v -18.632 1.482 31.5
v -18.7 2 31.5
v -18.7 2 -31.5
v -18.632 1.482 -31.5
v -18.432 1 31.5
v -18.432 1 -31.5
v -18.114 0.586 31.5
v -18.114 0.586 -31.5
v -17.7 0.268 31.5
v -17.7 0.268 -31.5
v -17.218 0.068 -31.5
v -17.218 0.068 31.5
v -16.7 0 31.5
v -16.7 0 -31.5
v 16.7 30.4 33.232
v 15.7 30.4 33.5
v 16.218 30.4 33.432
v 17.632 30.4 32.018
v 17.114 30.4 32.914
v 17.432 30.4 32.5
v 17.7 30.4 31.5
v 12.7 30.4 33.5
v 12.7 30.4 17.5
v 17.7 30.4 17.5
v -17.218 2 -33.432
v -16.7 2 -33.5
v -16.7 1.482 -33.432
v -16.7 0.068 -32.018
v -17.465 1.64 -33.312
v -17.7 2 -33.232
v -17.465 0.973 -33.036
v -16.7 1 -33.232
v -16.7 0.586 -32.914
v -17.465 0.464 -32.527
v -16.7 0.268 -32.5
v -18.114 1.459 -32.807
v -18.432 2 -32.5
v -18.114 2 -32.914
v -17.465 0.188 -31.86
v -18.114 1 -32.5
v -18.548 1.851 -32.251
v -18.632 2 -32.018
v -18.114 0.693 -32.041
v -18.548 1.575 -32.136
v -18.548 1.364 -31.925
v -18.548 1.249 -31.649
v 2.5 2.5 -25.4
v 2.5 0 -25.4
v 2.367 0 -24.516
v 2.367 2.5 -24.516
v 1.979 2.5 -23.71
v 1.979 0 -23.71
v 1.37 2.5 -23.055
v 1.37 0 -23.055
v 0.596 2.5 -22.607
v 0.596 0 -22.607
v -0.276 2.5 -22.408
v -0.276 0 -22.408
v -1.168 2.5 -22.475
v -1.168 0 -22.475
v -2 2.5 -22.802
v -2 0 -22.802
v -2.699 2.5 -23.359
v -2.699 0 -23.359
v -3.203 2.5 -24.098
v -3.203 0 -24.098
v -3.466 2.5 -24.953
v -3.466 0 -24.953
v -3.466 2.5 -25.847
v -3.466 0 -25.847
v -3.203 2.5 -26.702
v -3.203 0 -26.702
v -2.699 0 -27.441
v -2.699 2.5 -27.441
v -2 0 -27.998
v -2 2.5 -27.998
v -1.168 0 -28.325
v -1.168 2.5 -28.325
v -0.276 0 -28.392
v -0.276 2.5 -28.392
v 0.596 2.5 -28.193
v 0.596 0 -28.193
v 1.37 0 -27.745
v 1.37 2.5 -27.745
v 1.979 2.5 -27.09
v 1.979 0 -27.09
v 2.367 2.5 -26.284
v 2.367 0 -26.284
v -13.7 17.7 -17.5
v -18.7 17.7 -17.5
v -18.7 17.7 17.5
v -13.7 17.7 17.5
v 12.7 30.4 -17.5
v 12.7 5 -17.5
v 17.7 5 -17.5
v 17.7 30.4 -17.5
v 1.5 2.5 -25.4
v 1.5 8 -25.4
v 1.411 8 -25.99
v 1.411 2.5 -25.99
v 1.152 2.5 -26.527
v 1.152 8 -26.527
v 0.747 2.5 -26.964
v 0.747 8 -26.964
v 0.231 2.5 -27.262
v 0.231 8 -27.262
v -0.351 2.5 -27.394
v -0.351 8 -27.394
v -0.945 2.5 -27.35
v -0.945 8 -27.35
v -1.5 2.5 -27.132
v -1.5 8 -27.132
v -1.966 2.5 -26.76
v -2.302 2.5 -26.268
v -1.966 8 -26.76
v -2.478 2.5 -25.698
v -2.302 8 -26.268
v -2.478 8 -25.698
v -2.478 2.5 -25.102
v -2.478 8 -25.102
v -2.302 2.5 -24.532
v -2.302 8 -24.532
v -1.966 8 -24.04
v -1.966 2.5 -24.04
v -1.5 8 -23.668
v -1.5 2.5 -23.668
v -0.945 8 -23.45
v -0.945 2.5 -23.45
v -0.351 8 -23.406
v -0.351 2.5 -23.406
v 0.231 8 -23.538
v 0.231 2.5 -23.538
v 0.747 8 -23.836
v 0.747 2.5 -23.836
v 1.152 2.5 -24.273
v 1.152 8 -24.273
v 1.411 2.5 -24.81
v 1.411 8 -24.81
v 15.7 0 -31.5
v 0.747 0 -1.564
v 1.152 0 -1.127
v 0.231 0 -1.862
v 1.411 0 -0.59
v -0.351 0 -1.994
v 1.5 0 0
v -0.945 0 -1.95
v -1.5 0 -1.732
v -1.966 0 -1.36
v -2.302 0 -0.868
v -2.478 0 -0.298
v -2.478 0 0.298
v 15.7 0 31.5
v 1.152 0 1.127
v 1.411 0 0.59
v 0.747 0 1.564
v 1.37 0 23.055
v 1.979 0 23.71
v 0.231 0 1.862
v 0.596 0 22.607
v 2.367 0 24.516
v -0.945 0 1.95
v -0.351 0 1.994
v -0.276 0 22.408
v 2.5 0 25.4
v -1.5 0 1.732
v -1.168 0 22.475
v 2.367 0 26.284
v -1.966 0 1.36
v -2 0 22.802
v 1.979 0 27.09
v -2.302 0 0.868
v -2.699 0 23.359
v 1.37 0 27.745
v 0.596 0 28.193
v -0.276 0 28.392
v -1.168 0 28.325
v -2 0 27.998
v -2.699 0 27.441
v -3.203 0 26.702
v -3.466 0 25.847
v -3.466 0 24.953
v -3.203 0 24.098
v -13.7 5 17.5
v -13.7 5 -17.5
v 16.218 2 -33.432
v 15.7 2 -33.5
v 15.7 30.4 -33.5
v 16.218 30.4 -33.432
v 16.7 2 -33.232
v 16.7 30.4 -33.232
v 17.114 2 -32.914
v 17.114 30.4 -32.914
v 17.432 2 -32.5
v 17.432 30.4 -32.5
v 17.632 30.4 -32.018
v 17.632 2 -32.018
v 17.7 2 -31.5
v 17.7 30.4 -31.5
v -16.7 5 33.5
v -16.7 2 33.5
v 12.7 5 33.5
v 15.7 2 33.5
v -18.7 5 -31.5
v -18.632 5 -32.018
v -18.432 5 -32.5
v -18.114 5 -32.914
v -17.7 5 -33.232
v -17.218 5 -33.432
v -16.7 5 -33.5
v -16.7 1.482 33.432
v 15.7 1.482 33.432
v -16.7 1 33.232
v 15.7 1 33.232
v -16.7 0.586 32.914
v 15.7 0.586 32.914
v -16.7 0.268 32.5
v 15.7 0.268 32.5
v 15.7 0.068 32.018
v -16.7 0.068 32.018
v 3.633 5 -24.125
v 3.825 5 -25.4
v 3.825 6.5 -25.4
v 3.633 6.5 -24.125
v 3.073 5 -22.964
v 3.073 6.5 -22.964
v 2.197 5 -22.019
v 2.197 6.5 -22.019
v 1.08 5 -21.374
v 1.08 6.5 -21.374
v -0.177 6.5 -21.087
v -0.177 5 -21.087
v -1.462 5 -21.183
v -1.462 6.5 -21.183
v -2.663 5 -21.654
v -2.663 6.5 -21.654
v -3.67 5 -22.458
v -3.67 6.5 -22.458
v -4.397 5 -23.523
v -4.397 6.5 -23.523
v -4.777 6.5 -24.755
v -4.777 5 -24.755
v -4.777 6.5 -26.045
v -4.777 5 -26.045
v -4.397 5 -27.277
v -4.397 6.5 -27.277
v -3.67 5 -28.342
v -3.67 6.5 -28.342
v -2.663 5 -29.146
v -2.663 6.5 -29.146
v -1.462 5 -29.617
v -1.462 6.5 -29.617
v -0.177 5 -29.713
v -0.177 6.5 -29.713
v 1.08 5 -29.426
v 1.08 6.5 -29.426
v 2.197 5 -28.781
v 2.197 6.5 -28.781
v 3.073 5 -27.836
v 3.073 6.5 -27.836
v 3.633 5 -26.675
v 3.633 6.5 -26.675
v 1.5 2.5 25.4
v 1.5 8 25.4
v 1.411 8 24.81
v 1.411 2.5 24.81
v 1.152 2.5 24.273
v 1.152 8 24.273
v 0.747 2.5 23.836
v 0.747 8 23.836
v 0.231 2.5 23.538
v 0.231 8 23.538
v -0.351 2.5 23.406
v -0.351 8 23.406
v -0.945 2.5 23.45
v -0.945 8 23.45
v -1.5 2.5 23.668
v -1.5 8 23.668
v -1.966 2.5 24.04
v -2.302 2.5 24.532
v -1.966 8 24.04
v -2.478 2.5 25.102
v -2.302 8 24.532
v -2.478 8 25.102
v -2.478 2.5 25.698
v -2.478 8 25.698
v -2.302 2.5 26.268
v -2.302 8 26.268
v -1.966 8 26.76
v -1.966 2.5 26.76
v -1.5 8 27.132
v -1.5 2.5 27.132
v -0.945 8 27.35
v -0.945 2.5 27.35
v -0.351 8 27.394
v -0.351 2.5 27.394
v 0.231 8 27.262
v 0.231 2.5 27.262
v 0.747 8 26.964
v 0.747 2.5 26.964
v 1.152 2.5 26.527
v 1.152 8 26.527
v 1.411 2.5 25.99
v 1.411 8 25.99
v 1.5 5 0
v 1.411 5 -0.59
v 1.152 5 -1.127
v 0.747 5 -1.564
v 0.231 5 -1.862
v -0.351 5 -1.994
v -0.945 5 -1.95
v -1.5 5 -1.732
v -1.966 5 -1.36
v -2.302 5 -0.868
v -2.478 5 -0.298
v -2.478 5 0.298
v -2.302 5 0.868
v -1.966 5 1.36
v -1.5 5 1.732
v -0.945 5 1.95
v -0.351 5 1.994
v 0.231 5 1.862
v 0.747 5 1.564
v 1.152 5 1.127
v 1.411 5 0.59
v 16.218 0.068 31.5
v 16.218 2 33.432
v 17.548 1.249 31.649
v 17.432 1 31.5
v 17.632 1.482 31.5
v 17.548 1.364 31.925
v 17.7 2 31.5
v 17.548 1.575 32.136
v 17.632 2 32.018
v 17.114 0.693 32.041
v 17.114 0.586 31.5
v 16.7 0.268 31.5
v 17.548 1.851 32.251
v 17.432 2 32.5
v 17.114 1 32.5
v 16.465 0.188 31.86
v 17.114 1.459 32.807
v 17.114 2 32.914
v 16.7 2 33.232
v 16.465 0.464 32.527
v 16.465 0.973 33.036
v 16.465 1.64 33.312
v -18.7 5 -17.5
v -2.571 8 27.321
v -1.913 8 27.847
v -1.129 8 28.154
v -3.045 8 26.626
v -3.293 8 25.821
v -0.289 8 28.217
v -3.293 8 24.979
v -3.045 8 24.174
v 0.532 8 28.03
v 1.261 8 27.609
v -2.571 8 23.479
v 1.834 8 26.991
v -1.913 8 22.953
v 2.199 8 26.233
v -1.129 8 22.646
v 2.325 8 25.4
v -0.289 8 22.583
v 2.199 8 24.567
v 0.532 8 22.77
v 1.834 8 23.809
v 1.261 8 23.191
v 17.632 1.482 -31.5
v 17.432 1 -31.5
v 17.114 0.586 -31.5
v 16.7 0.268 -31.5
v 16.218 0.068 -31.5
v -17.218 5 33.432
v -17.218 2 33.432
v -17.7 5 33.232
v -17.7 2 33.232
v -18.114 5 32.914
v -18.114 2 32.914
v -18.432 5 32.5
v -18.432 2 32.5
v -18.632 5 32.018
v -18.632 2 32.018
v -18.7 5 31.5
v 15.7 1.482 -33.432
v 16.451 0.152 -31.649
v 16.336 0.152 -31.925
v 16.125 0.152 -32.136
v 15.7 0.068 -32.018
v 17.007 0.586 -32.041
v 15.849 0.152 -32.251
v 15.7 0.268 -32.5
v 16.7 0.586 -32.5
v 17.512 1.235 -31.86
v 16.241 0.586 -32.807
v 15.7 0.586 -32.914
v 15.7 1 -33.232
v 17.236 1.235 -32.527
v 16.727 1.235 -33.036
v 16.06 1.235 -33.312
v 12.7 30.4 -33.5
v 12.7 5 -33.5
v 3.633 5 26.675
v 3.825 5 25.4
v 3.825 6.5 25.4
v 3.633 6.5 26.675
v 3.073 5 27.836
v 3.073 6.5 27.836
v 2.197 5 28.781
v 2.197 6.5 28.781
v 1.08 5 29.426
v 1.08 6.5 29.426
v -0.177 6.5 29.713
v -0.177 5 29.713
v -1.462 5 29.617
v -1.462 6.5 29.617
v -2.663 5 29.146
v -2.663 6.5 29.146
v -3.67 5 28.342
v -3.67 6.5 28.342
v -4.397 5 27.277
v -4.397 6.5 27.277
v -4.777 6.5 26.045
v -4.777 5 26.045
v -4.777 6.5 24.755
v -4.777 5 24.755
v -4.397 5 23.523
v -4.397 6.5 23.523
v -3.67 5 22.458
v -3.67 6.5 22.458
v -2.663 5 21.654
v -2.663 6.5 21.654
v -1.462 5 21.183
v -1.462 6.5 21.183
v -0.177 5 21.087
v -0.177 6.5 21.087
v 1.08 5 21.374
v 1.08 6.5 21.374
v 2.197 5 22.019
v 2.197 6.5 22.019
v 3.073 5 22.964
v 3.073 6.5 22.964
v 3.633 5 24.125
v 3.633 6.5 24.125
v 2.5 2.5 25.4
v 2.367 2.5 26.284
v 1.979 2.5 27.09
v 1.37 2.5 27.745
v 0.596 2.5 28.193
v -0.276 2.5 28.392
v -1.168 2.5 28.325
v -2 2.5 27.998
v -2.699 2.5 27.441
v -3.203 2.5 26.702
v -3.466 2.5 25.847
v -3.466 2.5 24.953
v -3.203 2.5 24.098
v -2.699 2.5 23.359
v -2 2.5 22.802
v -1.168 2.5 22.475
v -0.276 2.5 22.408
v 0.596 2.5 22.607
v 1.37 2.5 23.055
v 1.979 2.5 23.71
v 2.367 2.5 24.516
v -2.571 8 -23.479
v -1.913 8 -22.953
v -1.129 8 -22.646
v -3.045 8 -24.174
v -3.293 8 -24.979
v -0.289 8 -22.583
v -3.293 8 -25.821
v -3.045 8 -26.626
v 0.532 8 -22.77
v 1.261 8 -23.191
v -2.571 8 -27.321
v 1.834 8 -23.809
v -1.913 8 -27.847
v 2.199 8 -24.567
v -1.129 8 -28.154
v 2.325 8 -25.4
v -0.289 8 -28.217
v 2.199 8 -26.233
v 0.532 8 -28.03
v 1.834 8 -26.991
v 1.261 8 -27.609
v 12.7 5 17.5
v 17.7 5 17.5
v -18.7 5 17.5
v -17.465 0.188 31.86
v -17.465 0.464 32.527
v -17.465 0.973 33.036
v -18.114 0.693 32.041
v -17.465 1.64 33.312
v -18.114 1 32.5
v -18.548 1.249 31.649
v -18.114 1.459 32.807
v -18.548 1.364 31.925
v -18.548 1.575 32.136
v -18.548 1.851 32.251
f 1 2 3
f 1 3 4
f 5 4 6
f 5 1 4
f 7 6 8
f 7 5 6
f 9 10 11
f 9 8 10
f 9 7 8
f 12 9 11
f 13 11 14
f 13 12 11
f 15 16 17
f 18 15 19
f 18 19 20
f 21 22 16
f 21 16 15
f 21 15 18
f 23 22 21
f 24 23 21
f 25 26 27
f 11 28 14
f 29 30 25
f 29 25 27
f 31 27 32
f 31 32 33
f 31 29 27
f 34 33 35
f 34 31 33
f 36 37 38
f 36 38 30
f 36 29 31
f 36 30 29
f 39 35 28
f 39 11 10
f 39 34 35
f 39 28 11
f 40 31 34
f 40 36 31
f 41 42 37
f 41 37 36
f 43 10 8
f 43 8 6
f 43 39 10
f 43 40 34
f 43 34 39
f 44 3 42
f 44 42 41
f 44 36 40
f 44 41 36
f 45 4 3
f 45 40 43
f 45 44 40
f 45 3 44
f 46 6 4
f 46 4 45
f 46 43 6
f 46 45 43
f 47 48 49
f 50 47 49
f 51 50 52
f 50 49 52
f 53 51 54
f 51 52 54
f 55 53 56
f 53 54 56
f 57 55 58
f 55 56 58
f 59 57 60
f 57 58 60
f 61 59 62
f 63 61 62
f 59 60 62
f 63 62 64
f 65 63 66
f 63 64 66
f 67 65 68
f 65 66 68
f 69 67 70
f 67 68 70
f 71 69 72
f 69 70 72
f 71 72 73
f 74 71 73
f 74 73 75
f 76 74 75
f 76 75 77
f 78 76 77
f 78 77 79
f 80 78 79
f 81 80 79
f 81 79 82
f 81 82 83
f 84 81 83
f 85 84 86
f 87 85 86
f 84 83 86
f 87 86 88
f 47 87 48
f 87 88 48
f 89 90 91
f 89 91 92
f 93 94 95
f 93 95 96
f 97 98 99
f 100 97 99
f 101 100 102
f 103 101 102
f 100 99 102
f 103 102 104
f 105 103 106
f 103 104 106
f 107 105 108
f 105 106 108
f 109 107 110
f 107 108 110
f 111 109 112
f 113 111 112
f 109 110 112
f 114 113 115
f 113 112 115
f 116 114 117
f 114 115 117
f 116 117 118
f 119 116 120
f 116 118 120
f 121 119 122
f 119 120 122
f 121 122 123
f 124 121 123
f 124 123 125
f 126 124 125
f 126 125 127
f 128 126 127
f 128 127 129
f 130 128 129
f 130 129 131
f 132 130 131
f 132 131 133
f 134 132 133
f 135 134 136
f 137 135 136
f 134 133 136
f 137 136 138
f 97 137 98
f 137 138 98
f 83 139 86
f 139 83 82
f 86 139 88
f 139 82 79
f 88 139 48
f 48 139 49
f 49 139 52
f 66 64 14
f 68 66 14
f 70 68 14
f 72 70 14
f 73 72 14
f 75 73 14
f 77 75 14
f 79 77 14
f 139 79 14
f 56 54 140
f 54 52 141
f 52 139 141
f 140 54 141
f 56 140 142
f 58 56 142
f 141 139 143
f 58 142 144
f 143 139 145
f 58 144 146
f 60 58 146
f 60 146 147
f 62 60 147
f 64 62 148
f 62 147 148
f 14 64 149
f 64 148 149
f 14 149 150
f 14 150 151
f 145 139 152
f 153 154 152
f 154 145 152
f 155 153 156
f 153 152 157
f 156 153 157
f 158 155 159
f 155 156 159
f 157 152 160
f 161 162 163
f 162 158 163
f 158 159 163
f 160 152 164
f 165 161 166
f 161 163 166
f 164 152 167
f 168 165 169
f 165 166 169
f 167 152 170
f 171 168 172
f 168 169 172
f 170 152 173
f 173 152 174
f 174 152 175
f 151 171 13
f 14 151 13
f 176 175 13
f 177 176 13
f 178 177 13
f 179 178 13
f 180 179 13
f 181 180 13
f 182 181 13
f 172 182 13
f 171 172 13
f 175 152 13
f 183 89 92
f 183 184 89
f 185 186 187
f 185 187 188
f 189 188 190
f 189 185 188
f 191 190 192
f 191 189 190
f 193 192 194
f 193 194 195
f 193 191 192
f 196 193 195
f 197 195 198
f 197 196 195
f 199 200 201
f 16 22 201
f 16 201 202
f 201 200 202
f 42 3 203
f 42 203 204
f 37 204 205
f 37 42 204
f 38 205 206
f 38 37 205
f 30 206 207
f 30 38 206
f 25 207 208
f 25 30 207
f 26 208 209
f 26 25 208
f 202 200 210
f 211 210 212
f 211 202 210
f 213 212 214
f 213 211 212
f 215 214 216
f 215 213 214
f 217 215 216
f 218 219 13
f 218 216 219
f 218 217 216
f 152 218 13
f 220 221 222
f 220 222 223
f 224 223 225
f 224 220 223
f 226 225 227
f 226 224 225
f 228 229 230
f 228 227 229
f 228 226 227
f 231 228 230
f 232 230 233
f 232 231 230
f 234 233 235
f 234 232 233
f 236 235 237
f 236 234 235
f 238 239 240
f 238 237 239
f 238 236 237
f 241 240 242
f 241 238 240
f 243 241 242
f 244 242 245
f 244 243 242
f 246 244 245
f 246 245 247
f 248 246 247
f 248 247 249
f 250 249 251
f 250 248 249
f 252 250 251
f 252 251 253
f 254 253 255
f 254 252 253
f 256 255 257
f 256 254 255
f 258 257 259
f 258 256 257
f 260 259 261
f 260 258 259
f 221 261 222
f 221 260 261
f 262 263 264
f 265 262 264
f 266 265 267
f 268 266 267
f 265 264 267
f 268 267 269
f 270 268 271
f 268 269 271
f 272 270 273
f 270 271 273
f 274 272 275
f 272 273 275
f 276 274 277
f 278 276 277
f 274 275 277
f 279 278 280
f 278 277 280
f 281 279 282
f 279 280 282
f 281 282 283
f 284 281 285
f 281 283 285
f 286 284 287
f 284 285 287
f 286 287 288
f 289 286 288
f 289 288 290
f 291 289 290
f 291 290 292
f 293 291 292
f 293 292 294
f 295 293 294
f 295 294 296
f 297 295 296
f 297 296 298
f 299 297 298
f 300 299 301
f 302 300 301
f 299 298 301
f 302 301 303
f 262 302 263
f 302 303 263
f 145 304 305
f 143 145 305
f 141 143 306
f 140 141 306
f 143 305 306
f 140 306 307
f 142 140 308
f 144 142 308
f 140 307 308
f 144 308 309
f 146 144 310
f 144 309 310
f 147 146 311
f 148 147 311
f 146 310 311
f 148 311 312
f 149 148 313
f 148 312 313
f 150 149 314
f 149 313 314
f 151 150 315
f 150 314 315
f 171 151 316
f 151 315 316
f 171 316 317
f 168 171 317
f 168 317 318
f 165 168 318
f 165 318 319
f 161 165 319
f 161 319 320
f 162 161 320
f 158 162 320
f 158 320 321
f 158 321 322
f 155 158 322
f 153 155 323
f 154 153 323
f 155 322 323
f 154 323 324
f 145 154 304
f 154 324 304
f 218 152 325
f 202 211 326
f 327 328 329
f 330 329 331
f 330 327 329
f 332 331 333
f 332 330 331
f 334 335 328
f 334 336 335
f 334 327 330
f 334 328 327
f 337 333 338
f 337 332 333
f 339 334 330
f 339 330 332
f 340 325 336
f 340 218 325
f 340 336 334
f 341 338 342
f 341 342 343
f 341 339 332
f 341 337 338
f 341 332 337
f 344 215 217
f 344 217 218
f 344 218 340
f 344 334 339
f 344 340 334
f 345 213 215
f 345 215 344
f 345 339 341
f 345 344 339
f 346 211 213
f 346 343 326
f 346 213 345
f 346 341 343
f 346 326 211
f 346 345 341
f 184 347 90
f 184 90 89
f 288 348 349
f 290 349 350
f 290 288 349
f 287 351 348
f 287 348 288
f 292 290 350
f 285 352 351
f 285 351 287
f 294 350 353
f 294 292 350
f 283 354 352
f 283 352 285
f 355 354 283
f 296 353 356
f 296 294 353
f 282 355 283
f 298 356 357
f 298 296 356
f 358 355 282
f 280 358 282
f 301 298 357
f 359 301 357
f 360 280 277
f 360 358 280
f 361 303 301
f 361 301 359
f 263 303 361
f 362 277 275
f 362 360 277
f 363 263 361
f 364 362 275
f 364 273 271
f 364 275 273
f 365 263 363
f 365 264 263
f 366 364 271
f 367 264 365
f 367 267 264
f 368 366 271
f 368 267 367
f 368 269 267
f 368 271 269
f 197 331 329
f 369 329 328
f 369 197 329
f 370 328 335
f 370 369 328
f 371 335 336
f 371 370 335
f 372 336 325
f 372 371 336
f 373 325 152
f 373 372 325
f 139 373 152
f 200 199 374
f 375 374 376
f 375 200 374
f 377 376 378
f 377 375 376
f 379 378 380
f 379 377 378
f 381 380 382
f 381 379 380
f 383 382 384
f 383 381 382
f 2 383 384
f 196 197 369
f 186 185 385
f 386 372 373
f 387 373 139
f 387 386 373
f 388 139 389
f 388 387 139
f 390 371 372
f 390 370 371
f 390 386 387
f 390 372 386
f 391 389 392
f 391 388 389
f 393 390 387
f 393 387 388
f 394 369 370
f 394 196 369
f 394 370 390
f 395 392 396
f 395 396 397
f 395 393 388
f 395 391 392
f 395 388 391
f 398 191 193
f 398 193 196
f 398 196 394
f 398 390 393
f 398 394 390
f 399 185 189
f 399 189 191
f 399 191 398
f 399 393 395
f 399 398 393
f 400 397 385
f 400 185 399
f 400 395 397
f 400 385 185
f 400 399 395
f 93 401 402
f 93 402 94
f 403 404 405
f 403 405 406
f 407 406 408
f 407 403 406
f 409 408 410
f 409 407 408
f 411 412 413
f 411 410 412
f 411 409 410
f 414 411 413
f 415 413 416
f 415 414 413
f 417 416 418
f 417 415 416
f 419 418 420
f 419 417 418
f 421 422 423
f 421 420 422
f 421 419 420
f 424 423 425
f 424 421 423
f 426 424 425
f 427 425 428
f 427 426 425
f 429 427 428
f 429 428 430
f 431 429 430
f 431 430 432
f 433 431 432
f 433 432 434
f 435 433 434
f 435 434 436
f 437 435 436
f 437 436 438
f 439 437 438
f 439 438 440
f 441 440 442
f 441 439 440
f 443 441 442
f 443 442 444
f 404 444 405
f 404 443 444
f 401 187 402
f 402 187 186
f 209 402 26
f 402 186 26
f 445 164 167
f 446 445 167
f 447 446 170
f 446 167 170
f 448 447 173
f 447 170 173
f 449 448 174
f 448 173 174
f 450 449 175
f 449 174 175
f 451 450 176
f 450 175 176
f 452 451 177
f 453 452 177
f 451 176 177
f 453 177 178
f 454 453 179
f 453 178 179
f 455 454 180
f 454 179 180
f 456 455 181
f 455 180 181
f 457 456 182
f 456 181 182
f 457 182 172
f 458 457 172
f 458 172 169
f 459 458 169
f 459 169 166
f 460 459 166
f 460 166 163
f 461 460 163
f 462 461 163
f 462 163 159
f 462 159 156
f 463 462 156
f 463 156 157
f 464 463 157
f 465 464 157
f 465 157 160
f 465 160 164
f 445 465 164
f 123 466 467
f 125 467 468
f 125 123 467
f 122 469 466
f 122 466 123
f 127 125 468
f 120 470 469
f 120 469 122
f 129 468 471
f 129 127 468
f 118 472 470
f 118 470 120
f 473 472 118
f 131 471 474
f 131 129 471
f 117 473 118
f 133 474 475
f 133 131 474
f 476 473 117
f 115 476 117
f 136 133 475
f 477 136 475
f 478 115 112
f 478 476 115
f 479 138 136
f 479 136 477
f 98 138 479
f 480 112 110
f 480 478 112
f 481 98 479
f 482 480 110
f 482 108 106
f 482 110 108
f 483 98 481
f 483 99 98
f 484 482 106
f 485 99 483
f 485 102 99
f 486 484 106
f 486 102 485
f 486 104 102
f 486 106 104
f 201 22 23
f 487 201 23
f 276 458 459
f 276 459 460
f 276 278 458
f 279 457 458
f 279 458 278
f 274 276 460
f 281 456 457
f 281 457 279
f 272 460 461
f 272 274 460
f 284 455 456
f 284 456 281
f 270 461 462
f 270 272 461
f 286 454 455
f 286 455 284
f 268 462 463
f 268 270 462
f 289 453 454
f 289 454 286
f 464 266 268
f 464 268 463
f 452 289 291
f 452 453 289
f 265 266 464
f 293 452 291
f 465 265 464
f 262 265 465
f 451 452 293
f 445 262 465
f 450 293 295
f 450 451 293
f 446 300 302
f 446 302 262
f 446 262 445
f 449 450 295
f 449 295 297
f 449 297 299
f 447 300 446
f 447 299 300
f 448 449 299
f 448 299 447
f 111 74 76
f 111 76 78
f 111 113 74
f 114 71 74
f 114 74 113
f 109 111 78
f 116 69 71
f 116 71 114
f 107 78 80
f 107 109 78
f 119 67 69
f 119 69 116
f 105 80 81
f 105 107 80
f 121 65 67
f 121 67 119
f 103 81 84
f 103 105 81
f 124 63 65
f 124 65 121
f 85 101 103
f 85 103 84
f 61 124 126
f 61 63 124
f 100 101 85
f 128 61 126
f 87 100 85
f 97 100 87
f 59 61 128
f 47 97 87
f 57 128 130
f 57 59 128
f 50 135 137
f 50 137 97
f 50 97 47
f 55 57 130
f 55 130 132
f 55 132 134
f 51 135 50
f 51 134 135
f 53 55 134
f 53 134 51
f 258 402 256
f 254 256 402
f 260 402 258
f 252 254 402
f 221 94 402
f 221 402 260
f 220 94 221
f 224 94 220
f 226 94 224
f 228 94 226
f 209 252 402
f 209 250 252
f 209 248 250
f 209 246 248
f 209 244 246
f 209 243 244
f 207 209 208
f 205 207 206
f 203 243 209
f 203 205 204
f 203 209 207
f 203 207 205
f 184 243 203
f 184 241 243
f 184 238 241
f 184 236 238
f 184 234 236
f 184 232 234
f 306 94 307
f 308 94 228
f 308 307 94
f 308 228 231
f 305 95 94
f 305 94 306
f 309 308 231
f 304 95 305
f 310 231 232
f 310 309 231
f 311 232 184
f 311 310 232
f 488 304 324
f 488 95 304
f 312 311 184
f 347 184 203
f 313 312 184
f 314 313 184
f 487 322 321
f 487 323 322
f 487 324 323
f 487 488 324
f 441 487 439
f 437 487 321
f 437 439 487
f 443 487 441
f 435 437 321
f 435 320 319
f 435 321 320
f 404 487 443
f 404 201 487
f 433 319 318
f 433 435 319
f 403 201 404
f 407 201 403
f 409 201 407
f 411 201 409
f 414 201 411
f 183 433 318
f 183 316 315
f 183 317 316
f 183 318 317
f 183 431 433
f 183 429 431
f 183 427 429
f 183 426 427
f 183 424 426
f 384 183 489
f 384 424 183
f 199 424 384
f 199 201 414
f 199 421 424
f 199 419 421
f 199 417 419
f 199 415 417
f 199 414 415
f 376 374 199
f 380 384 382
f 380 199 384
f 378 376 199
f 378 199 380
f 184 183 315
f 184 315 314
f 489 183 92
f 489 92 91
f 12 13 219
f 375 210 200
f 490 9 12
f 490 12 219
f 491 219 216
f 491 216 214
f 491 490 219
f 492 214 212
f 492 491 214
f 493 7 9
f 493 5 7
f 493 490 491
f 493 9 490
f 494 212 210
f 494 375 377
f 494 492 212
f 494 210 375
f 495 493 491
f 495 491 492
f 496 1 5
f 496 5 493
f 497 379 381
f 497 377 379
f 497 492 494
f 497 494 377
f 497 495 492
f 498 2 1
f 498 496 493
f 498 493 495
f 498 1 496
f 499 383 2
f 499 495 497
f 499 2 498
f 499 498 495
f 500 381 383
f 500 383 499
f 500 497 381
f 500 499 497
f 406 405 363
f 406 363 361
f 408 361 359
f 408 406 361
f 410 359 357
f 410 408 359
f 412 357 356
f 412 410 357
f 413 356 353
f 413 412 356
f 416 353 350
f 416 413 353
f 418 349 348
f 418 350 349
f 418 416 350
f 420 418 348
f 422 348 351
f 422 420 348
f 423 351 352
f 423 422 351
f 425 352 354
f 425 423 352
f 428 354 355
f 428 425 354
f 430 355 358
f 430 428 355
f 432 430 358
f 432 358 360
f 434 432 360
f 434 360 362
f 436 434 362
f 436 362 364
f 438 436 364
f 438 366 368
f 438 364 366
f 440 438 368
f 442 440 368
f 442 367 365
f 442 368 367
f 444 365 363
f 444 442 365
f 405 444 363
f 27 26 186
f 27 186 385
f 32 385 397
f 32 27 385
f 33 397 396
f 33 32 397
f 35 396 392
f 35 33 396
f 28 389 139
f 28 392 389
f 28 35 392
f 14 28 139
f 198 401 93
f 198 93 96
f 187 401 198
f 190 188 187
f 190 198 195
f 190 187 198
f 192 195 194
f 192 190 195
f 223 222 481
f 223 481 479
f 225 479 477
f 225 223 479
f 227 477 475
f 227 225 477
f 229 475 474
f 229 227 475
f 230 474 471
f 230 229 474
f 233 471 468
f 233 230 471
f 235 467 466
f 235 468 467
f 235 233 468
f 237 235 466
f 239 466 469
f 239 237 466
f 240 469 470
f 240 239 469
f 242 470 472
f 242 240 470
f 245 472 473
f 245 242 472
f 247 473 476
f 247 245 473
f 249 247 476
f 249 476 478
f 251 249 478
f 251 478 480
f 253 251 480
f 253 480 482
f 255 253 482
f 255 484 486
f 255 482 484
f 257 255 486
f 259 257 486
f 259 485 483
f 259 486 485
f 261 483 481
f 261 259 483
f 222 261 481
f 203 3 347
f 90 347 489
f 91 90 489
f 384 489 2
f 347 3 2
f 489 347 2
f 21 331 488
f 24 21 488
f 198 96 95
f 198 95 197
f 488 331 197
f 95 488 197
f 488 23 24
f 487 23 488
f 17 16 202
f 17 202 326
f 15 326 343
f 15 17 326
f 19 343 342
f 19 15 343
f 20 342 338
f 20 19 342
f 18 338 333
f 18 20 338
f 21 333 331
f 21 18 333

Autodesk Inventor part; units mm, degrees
ref_plane "YZ Plane" through (0, 0, 0) normal (1, 0, 0) x (0, 1, 0)
ref_plane "XZ Plane" through (0, 0, 0) normal (0, 1, 0) x (-1, 0, 0)
ref_plane "XY Plane" through (0, 0, 0) normal (0, 0, 1) x (1, 0, 0)
sketch "Sketch1" plane through (0, 0, 0) normal (0, 1, 0) x (-1, 0, 0)
  line L0 (18.7, 33.5) -> (-17.7, 33.5)
  line L1 (-17.7, 33.5) -> (-17.7, -33.5)
  line L2 (-17.7, -33.5) -> (18.7, -33.5)
  line L3 (18.7, -33.5) -> (18.7, 33.5)
  point P0 (0, 0)
  dimension "d0" = 36.4
  dimension "d1" = 67
extrude "Extrusion1" add sketch "Sketch1" along normal blind 5
sketch "Sketch2" plane through (0, 5, 0) normal (0, 1, 0) x (1, 0, 0)
  line L0 (-18.7, -33.5) -> (17.7, -33.5) projected
  line L1 (17.7, -33.5) -> (12.7, -33.5)
  line L2 (12.7, -33.5) -> (12.7, -12.5)
  line L3 (12.7, -12.5) -> (17.7, -12.5)
  line L4 (17.7, -12.5) -> (17.7, -33.5)
  line L5 (17.7, -33.5) -> (17.7, 33.5) projected
  line L6 (17.7, 33.5) -> (12.7, 33.5)
  line L7 (12.7, 33.5) -> (12.7, 12.5)
  line L8 (12.7, 12.5) -> (17.7, 12.5)
  line L9 (17.7, 12.5) -> (17.7, 33.5)
  point P0 (0, 0)
  dimension "d4" = 5
  dimension "d5" = 21
  dimension "d6" = 5
  dimension "d7" = 21
extrude "Extrusion2" add sketch "Sketch2" along normal blind 25.4
fillet "Fillet2" radius 2 6 edges at (-0.5, 0, 33.5) (-18.7, 0, 0) (17.7, 15.2, 33.5) (17.7, 15.2, -33.5) (-0.5, 0, -33.5) (17.7, 0, 0)
sketch "Sketch6" plane through (0, 5, 0) normal (0, 1, 0) x (1, 0, 0)
  line L0 (-18.7, -33.5) -> (-18.7, 33.5) projected
  line L1 (-18.7, 12) -> (-13.7, 12)
  line L2 (-13.7, 12) -> (-13.7, -12)
  line L3 (-13.7, -12) -> (-18.7, -12)
  line L4 (-18.7, -12) -> (-18.7, 12)
  point P0 (0, 0)
  point P1 (-18.7, -12)
  dimension "d26" = 5
  dimension "d27" = 24
extrude "Extrusion6" add sketch "Sketch6" along normal blind 25.4
fillet "Fillet3" radius 2 4 edges at (-18.1142, 0.5858, 32.9142) (-18.7, 3.5, 33.5) (-18.1142, 0.5858, -32.9142) (-18.7, 3.5, -33.5)
sketch "Sketch8" plane through (0, 5, 0) normal (0, 1, 0) x (1, 0, 0)
  circle A0 centre (-0.5, 0) radius 4.325
  circle A1 centre (-0.5, -25.4) radius 4.325
  circle A2 centre (-0.5, 25.4) radius 4.325
  point P0 (0, 0)
  dimension "d37" = 8.65
  dimension "d38" = 8.65
  dimension "d39" = 8.65
extrude "Extrusion8" add sketch "Sketch8" along normal blind 3 contours A1 | A2
chamfer "Chamfer1" distance 1.5 angle 45 2 edges at (-4.825, 8, -25.4) (-4.825, 8, 25.4)
sketch "Sketch9" plane through (-0.5, 8, 0) normal (0, 1, 0) x (1, 0, 0)
  circle A0 centre (0, 0) radius 2.825 projected
  circle A1 centre (0, 0) radius 2
  circle A2 centre (0, 25.4) radius 2.825 projected
  circle A3 centre (0, 25.4) radius 2
  circle A4 centre (0, -25.4) radius 2.825 projected
  circle A5 centre (0, -25.4) radius 2
  point P0 (0.5, 0)
  dimension "d45" = 4
  dimension "d46" = 4
  dimension "d47" = 4
extrude "Extrusion9" cut sketch "Sketch9" against normal blind 20 contours A1 | A3 | A5
sketch "Sketch10" plane through (0, 0, 0) normal (0, -1, 0) x (1, 0, 0)
  circle A0 centre (-0.5, -25.4) radius 2.825 projected
  circle A1 centre (-0.5, -25.4) radius 3
  circle A2 centre (-0.5, 0) radius 4.325 projected
  circle A3 centre (-0.5, 0) radius 3
  circle A4 centre (-0.5, 25.4) radius 2.825 projected
  circle A5 centre (-0.5, 25.4) radius 3
  point P0 (0, 0)
  dimension "d50" = 6
  dimension "d51" = 6
  dimension "d52" = 6
extrude "Extrusion10" cut sketch "Sketch10" against normal blind 2.5 contours A0 | A1 | A4 | A5
sketch "Sketch11" plane through (-18.7, 5, 12) normal (-1, 0, 0) x (0, 0, 1)
  line L0 (21.5, 0) -> (0.5, 0) projected
  line L1 (-29.5, 29.5575) -> (5.5, 29.5575)
  line L2 (5.5, 29.5575) -> (5.5, 0)
  line L3 (5.5, 0) -> (-29.5, 0)
  line L4 (-29.5, 0) -> (-29.5, 29.5575)
  point P0 (-12, -5)
  dimension "d55" = 35
extrude "Extrusion11" cut sketch "Sketch11" against normal blind 50
sketch "Sketch12" plane through (0, 5, 0) normal (0, 1, 0) x (1, 0, 0)
  line L0 (-18.7, 31.5) -> (-18.7, -31.5) projected
  line L1 (-18.7, 17.5) -> (-13.7, 17.5)
  line L2 (-13.7, 17.5) -> (-13.7, -17.5)
  line L3 (-13.7, -17.5) -> (-18.7, -17.5)
  line L4 (-18.7, -17.5) -> (-18.7, 17.5)
  point P0 (0, 0)
  dimension "d58" = 5
extrude "Extrusion12" add sketch "Sketch12" along normal blind 12.7
properties part number "bigSpringBedMount"
